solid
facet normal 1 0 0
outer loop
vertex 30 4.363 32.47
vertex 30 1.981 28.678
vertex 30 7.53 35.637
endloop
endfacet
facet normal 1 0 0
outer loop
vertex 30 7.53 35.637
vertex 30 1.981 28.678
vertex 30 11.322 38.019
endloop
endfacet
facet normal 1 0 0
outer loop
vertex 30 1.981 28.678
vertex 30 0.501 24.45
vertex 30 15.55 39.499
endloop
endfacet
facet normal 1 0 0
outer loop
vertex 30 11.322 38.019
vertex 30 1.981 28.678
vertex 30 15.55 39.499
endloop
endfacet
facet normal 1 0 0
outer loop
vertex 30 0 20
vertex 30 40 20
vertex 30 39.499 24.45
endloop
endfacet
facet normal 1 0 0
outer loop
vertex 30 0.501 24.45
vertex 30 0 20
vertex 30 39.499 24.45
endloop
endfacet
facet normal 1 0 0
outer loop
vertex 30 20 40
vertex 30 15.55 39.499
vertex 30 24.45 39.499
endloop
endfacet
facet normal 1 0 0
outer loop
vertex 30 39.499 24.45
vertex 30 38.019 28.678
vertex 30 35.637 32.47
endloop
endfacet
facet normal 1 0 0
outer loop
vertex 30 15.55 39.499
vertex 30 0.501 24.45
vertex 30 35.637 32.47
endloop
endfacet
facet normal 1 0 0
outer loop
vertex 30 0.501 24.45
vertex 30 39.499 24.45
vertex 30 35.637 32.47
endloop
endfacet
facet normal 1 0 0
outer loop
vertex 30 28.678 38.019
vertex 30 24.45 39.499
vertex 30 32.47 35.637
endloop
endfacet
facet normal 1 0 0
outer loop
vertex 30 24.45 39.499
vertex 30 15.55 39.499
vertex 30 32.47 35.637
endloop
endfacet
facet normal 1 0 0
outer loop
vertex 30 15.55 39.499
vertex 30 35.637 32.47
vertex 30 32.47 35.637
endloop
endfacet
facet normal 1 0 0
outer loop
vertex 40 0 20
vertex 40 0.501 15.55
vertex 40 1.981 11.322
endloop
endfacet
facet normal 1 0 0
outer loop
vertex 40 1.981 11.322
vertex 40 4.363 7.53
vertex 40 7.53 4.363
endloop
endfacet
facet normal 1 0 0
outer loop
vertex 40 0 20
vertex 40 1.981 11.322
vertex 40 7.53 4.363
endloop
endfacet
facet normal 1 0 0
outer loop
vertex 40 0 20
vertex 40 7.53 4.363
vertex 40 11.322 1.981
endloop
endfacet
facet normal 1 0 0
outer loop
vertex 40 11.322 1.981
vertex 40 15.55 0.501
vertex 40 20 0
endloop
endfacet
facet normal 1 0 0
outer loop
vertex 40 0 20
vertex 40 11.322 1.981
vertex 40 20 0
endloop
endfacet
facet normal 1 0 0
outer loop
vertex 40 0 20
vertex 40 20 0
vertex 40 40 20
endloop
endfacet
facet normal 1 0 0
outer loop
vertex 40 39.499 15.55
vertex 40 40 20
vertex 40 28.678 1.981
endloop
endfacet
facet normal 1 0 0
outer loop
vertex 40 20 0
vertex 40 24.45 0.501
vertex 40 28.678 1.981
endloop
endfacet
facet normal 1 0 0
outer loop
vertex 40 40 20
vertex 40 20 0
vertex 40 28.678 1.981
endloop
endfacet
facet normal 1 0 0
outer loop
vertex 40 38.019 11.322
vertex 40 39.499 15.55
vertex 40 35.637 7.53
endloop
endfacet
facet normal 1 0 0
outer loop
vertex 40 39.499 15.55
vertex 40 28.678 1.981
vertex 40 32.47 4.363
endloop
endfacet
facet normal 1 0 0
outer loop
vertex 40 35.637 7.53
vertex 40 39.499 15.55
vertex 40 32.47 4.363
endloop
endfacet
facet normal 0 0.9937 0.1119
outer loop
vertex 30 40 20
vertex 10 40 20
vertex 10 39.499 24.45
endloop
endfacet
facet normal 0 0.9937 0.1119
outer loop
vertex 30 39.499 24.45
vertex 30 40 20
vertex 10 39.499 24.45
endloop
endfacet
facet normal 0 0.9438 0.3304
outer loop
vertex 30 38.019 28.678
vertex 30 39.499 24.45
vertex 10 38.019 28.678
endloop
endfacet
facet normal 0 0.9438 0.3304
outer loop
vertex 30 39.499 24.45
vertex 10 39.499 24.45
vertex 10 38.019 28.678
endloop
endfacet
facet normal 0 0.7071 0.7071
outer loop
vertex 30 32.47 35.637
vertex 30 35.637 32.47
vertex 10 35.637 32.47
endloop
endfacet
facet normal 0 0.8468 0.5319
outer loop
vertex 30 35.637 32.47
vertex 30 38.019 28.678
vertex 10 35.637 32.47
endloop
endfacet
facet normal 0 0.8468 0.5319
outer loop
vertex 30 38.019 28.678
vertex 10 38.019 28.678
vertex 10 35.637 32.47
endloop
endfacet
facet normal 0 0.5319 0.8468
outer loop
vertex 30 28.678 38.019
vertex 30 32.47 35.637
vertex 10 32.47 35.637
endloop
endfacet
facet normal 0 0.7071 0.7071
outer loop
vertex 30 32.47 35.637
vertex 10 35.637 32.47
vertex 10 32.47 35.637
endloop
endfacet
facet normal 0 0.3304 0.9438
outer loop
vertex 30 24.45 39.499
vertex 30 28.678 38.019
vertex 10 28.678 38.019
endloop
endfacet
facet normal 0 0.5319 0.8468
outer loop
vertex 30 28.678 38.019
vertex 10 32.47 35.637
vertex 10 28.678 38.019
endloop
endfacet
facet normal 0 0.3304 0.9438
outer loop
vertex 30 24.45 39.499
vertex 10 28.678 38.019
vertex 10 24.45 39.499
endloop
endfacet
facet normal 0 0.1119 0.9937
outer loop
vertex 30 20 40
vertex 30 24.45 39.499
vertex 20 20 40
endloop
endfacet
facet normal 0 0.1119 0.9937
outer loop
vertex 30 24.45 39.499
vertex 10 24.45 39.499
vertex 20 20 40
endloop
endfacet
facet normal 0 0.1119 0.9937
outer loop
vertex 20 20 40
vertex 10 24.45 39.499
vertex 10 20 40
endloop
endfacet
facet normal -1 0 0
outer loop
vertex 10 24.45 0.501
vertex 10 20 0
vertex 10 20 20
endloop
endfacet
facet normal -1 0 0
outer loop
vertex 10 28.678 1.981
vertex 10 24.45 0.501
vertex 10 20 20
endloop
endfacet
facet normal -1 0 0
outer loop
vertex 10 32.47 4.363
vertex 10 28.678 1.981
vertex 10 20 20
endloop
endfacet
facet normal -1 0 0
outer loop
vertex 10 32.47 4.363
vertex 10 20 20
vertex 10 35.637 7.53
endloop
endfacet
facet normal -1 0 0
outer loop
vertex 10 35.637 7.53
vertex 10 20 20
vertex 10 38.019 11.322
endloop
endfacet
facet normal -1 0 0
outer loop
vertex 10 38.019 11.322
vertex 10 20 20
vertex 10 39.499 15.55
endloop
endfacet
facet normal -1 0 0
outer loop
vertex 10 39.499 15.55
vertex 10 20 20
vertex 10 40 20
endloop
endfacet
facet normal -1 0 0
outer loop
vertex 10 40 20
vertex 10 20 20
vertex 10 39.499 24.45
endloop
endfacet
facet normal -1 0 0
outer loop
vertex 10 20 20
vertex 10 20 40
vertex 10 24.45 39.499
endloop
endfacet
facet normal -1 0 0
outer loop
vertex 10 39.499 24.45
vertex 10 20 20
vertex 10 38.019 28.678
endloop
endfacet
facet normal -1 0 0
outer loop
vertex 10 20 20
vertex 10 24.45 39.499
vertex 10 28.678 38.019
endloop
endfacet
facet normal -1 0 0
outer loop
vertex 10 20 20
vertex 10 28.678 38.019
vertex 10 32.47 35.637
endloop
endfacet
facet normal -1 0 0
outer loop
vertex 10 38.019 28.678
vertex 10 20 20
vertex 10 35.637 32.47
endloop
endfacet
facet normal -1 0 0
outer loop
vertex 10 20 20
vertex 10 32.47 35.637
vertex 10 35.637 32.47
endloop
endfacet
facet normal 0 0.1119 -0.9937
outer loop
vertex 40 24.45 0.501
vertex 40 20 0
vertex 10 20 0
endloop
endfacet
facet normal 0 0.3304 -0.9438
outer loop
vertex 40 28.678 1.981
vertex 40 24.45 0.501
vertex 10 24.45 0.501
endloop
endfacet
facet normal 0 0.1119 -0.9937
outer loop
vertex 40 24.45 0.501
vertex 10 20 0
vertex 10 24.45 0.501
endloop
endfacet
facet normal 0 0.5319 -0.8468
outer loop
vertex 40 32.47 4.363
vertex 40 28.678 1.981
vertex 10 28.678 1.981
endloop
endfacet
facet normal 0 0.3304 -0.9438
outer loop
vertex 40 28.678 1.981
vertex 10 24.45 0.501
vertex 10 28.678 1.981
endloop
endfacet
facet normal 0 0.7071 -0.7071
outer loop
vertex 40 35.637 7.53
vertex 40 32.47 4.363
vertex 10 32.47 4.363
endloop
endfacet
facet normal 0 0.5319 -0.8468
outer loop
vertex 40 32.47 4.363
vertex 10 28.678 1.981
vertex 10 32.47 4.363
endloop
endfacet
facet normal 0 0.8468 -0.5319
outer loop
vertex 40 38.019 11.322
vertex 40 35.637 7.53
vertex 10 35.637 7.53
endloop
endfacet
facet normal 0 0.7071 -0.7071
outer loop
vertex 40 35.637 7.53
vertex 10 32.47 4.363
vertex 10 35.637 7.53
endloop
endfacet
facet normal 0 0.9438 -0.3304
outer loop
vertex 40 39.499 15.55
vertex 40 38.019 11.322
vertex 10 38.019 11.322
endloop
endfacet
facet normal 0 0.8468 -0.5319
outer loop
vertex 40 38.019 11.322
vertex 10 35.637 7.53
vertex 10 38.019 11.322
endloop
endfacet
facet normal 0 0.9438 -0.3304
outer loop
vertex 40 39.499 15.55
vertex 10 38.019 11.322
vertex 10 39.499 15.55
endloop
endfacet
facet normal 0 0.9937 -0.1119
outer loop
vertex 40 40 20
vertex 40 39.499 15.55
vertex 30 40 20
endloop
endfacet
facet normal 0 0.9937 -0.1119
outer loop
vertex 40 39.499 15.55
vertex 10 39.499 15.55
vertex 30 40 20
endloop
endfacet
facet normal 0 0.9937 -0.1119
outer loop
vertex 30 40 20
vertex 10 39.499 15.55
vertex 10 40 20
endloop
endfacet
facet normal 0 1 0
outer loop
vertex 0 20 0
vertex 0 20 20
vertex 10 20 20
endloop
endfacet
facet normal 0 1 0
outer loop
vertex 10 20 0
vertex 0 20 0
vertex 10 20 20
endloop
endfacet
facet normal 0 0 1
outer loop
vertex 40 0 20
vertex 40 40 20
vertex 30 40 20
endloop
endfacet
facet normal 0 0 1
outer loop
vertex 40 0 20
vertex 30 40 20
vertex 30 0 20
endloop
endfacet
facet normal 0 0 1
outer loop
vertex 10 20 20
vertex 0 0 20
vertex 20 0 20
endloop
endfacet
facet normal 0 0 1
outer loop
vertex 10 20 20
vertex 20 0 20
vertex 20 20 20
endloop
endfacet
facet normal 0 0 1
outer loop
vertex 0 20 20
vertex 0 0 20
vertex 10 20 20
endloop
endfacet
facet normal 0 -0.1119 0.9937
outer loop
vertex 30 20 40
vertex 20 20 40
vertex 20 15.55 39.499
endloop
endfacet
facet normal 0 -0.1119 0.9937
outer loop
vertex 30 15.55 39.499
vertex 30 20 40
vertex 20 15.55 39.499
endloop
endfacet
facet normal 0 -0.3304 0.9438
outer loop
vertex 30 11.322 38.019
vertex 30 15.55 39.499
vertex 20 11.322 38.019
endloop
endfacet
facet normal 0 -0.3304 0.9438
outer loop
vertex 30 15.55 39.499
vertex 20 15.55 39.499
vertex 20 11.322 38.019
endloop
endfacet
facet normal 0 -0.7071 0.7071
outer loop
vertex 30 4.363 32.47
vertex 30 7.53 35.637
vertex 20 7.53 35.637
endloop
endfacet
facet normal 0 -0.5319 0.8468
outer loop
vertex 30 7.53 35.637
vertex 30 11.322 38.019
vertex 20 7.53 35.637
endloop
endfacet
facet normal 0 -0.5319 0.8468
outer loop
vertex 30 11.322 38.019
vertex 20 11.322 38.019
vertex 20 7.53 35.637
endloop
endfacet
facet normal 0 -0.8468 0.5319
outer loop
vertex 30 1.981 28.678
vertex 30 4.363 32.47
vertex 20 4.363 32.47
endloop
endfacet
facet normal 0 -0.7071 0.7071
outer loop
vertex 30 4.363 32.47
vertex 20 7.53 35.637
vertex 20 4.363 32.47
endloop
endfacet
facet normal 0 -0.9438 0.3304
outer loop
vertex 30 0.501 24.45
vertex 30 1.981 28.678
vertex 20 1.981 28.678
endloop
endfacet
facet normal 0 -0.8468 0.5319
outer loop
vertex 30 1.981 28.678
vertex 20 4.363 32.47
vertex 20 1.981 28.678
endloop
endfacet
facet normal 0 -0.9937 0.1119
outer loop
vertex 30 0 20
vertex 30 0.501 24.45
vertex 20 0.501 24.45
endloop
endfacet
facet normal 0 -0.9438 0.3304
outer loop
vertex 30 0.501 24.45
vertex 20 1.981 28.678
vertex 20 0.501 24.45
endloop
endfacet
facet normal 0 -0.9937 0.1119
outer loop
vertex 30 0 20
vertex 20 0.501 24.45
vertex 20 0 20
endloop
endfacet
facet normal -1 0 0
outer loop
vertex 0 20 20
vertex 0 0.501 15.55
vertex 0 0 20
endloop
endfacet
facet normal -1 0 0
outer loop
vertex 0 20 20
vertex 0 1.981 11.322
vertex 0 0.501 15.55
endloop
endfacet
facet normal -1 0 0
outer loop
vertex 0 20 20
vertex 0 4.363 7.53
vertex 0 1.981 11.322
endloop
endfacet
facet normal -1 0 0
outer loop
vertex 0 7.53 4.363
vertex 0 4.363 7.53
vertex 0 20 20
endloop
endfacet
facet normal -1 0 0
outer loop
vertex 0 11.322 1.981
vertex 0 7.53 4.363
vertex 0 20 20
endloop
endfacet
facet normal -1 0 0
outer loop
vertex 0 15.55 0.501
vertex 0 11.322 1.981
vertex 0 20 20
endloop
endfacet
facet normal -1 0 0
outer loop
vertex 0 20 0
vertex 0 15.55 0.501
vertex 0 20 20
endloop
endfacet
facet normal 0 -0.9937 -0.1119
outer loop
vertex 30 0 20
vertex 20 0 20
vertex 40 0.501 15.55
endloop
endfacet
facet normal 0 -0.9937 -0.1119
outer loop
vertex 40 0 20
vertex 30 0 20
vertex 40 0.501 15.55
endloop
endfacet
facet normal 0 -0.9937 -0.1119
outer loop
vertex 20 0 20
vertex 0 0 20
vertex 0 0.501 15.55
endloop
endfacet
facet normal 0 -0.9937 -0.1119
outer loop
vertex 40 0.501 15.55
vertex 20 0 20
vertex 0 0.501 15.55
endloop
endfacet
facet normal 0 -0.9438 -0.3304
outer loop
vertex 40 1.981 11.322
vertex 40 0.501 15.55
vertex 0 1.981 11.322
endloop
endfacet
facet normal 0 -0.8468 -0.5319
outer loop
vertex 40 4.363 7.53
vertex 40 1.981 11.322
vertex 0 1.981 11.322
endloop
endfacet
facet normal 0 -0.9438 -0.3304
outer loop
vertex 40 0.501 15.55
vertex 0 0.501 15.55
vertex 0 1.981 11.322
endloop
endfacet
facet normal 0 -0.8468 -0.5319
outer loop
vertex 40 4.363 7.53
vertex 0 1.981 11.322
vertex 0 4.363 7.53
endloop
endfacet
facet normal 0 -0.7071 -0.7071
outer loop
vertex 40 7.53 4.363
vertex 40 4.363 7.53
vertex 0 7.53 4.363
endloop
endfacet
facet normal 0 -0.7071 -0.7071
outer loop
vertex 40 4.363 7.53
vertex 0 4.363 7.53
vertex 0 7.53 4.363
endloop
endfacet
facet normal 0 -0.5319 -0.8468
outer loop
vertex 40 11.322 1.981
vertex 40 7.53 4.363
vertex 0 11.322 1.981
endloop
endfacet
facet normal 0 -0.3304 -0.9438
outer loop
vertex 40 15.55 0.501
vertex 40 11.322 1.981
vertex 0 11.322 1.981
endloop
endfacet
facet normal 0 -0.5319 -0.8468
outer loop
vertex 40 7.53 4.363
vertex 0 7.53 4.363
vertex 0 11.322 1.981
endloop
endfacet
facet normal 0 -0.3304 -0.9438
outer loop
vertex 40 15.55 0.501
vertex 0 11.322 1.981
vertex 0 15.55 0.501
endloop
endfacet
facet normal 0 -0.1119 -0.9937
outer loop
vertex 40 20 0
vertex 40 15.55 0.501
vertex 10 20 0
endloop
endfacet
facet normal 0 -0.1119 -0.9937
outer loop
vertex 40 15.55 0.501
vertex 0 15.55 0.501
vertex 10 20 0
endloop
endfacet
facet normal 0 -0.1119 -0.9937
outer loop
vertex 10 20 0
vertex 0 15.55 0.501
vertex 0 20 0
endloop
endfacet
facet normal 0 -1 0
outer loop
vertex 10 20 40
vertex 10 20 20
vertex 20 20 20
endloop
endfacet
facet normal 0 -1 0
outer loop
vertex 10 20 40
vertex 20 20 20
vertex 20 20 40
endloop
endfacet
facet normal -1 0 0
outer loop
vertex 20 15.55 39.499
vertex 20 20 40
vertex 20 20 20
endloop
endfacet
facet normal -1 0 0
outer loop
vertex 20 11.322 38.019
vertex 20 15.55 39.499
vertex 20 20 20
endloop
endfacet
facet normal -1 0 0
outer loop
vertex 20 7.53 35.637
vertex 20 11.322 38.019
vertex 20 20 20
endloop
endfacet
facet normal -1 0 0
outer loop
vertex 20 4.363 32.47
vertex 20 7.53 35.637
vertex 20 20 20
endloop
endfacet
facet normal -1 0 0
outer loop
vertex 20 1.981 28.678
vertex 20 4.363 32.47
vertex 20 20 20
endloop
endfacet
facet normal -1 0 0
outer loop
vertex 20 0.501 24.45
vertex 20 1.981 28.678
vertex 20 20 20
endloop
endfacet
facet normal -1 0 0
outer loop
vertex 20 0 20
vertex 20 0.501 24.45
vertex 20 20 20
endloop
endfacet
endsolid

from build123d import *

# Parameters (mm, degrees)
SKETCH1_W           = 40
SKETCH1_H           = 40
BOSS_EXTRUDE1_DEPTH = 40
SKETCH2_W           = 10
SKETCH2_H           = 20
CUT_EXTRUDE1_DEPTH  = 40
CUT_EXTRUDE2_DEPTH  = 40
CUT_EXTRUDE3_DEPTH  = 40
CUT_EXTRUDE4_DEPTH  = 20
CUT_EXTRUDE5_DEPTH  = 10


with BuildPart() as part:
    # Sketch1 → Boss-Extrude1 (new body)
    with BuildSketch(Plane.XY):
        with Locations((20, 20)):
            Rectangle(SKETCH1_W, SKETCH1_H)
    extrude(amount=BOSS_EXTRUDE1_DEPTH)

    # Sketch2 → Cut-Extrude1 (cut)
    with BuildSketch(Plane.XY.offset(40)):
        with Locations((5, 30)):
            Rectangle(SKETCH2_W, SKETCH2_H)
    extrude(amount=-CUT_EXTRUDE1_DEPTH, mode=Mode.SUBTRACT)

    # Sketch3 → Cut-Extrude2 (cut)
    with BuildSketch(Plane.ZY.offset(-10)):
        with BuildLine():
            Line((0, 40), (0, 20))
            ThreePointArc((0, 20), (5.857864376, 34.142135624), (20, 40))
            Line((20, 40), (0, 40))
        make_face()
        with BuildLine():
            Line((40, 40), (20, 40))
            ThreePointArc((20, 40), (34.142135624, 34.142135624), (40, 20))
            Line((40, 20), (40, 40))
        make_face()
    extrude(amount=-CUT_EXTRUDE2_DEPTH, mode=Mode.SUBTRACT)

    # Sketch4 → Cut-Extrude3 (cut)
    with BuildSketch(Plane.ZY):
        with BuildLine():
            ThreePointArc((20, 0), (5.857864376, 5.857864376), (0, 20))
            Line((0, 20), (0, 0))
            Line((0, 0), (20, 0))
        make_face()
        with BuildLine():
            ThreePointArc((40, 20), (34.142135624, 5.857864376), (20, 0))
            Line((20, 0), (40, 0))
            Line((40, 0), (40, 20))
        make_face()
    extrude(amount=-CUT_EXTRUDE3_DEPTH, mode=Mode.SUBTRACT)

    # Sketch5 → Cut-Extrude4 (cut)
    with BuildSketch(Plane.ZY):
        with BuildLine():
            Line((20, 0), (20, 20))
            Line((20, 20), (40, 20))
            ThreePointArc((40, 20), (34.142135624, 5.857864376), (20, 0))
        make_face()
    extrude(amount=-CUT_EXTRUDE4_DEPTH, mode=Mode.SUBTRACT)

    # Sketch6 → Cut-Extrude5 (cut)
    with BuildSketch(Plane(origin=(40, 0, 0), x_dir=(0, 0, -1), z_dir=(1, 0, 0))):
        with BuildLine():
            Line((-20, 40), (-20, 0))
            ThreePointArc((-20, 0), (-40, 20), (-20, 40))
        make_face()
    extrude(amount=-CUT_EXTRUDE5_DEPTH, mode=Mode.SUBTRACT)


solid = part.part
